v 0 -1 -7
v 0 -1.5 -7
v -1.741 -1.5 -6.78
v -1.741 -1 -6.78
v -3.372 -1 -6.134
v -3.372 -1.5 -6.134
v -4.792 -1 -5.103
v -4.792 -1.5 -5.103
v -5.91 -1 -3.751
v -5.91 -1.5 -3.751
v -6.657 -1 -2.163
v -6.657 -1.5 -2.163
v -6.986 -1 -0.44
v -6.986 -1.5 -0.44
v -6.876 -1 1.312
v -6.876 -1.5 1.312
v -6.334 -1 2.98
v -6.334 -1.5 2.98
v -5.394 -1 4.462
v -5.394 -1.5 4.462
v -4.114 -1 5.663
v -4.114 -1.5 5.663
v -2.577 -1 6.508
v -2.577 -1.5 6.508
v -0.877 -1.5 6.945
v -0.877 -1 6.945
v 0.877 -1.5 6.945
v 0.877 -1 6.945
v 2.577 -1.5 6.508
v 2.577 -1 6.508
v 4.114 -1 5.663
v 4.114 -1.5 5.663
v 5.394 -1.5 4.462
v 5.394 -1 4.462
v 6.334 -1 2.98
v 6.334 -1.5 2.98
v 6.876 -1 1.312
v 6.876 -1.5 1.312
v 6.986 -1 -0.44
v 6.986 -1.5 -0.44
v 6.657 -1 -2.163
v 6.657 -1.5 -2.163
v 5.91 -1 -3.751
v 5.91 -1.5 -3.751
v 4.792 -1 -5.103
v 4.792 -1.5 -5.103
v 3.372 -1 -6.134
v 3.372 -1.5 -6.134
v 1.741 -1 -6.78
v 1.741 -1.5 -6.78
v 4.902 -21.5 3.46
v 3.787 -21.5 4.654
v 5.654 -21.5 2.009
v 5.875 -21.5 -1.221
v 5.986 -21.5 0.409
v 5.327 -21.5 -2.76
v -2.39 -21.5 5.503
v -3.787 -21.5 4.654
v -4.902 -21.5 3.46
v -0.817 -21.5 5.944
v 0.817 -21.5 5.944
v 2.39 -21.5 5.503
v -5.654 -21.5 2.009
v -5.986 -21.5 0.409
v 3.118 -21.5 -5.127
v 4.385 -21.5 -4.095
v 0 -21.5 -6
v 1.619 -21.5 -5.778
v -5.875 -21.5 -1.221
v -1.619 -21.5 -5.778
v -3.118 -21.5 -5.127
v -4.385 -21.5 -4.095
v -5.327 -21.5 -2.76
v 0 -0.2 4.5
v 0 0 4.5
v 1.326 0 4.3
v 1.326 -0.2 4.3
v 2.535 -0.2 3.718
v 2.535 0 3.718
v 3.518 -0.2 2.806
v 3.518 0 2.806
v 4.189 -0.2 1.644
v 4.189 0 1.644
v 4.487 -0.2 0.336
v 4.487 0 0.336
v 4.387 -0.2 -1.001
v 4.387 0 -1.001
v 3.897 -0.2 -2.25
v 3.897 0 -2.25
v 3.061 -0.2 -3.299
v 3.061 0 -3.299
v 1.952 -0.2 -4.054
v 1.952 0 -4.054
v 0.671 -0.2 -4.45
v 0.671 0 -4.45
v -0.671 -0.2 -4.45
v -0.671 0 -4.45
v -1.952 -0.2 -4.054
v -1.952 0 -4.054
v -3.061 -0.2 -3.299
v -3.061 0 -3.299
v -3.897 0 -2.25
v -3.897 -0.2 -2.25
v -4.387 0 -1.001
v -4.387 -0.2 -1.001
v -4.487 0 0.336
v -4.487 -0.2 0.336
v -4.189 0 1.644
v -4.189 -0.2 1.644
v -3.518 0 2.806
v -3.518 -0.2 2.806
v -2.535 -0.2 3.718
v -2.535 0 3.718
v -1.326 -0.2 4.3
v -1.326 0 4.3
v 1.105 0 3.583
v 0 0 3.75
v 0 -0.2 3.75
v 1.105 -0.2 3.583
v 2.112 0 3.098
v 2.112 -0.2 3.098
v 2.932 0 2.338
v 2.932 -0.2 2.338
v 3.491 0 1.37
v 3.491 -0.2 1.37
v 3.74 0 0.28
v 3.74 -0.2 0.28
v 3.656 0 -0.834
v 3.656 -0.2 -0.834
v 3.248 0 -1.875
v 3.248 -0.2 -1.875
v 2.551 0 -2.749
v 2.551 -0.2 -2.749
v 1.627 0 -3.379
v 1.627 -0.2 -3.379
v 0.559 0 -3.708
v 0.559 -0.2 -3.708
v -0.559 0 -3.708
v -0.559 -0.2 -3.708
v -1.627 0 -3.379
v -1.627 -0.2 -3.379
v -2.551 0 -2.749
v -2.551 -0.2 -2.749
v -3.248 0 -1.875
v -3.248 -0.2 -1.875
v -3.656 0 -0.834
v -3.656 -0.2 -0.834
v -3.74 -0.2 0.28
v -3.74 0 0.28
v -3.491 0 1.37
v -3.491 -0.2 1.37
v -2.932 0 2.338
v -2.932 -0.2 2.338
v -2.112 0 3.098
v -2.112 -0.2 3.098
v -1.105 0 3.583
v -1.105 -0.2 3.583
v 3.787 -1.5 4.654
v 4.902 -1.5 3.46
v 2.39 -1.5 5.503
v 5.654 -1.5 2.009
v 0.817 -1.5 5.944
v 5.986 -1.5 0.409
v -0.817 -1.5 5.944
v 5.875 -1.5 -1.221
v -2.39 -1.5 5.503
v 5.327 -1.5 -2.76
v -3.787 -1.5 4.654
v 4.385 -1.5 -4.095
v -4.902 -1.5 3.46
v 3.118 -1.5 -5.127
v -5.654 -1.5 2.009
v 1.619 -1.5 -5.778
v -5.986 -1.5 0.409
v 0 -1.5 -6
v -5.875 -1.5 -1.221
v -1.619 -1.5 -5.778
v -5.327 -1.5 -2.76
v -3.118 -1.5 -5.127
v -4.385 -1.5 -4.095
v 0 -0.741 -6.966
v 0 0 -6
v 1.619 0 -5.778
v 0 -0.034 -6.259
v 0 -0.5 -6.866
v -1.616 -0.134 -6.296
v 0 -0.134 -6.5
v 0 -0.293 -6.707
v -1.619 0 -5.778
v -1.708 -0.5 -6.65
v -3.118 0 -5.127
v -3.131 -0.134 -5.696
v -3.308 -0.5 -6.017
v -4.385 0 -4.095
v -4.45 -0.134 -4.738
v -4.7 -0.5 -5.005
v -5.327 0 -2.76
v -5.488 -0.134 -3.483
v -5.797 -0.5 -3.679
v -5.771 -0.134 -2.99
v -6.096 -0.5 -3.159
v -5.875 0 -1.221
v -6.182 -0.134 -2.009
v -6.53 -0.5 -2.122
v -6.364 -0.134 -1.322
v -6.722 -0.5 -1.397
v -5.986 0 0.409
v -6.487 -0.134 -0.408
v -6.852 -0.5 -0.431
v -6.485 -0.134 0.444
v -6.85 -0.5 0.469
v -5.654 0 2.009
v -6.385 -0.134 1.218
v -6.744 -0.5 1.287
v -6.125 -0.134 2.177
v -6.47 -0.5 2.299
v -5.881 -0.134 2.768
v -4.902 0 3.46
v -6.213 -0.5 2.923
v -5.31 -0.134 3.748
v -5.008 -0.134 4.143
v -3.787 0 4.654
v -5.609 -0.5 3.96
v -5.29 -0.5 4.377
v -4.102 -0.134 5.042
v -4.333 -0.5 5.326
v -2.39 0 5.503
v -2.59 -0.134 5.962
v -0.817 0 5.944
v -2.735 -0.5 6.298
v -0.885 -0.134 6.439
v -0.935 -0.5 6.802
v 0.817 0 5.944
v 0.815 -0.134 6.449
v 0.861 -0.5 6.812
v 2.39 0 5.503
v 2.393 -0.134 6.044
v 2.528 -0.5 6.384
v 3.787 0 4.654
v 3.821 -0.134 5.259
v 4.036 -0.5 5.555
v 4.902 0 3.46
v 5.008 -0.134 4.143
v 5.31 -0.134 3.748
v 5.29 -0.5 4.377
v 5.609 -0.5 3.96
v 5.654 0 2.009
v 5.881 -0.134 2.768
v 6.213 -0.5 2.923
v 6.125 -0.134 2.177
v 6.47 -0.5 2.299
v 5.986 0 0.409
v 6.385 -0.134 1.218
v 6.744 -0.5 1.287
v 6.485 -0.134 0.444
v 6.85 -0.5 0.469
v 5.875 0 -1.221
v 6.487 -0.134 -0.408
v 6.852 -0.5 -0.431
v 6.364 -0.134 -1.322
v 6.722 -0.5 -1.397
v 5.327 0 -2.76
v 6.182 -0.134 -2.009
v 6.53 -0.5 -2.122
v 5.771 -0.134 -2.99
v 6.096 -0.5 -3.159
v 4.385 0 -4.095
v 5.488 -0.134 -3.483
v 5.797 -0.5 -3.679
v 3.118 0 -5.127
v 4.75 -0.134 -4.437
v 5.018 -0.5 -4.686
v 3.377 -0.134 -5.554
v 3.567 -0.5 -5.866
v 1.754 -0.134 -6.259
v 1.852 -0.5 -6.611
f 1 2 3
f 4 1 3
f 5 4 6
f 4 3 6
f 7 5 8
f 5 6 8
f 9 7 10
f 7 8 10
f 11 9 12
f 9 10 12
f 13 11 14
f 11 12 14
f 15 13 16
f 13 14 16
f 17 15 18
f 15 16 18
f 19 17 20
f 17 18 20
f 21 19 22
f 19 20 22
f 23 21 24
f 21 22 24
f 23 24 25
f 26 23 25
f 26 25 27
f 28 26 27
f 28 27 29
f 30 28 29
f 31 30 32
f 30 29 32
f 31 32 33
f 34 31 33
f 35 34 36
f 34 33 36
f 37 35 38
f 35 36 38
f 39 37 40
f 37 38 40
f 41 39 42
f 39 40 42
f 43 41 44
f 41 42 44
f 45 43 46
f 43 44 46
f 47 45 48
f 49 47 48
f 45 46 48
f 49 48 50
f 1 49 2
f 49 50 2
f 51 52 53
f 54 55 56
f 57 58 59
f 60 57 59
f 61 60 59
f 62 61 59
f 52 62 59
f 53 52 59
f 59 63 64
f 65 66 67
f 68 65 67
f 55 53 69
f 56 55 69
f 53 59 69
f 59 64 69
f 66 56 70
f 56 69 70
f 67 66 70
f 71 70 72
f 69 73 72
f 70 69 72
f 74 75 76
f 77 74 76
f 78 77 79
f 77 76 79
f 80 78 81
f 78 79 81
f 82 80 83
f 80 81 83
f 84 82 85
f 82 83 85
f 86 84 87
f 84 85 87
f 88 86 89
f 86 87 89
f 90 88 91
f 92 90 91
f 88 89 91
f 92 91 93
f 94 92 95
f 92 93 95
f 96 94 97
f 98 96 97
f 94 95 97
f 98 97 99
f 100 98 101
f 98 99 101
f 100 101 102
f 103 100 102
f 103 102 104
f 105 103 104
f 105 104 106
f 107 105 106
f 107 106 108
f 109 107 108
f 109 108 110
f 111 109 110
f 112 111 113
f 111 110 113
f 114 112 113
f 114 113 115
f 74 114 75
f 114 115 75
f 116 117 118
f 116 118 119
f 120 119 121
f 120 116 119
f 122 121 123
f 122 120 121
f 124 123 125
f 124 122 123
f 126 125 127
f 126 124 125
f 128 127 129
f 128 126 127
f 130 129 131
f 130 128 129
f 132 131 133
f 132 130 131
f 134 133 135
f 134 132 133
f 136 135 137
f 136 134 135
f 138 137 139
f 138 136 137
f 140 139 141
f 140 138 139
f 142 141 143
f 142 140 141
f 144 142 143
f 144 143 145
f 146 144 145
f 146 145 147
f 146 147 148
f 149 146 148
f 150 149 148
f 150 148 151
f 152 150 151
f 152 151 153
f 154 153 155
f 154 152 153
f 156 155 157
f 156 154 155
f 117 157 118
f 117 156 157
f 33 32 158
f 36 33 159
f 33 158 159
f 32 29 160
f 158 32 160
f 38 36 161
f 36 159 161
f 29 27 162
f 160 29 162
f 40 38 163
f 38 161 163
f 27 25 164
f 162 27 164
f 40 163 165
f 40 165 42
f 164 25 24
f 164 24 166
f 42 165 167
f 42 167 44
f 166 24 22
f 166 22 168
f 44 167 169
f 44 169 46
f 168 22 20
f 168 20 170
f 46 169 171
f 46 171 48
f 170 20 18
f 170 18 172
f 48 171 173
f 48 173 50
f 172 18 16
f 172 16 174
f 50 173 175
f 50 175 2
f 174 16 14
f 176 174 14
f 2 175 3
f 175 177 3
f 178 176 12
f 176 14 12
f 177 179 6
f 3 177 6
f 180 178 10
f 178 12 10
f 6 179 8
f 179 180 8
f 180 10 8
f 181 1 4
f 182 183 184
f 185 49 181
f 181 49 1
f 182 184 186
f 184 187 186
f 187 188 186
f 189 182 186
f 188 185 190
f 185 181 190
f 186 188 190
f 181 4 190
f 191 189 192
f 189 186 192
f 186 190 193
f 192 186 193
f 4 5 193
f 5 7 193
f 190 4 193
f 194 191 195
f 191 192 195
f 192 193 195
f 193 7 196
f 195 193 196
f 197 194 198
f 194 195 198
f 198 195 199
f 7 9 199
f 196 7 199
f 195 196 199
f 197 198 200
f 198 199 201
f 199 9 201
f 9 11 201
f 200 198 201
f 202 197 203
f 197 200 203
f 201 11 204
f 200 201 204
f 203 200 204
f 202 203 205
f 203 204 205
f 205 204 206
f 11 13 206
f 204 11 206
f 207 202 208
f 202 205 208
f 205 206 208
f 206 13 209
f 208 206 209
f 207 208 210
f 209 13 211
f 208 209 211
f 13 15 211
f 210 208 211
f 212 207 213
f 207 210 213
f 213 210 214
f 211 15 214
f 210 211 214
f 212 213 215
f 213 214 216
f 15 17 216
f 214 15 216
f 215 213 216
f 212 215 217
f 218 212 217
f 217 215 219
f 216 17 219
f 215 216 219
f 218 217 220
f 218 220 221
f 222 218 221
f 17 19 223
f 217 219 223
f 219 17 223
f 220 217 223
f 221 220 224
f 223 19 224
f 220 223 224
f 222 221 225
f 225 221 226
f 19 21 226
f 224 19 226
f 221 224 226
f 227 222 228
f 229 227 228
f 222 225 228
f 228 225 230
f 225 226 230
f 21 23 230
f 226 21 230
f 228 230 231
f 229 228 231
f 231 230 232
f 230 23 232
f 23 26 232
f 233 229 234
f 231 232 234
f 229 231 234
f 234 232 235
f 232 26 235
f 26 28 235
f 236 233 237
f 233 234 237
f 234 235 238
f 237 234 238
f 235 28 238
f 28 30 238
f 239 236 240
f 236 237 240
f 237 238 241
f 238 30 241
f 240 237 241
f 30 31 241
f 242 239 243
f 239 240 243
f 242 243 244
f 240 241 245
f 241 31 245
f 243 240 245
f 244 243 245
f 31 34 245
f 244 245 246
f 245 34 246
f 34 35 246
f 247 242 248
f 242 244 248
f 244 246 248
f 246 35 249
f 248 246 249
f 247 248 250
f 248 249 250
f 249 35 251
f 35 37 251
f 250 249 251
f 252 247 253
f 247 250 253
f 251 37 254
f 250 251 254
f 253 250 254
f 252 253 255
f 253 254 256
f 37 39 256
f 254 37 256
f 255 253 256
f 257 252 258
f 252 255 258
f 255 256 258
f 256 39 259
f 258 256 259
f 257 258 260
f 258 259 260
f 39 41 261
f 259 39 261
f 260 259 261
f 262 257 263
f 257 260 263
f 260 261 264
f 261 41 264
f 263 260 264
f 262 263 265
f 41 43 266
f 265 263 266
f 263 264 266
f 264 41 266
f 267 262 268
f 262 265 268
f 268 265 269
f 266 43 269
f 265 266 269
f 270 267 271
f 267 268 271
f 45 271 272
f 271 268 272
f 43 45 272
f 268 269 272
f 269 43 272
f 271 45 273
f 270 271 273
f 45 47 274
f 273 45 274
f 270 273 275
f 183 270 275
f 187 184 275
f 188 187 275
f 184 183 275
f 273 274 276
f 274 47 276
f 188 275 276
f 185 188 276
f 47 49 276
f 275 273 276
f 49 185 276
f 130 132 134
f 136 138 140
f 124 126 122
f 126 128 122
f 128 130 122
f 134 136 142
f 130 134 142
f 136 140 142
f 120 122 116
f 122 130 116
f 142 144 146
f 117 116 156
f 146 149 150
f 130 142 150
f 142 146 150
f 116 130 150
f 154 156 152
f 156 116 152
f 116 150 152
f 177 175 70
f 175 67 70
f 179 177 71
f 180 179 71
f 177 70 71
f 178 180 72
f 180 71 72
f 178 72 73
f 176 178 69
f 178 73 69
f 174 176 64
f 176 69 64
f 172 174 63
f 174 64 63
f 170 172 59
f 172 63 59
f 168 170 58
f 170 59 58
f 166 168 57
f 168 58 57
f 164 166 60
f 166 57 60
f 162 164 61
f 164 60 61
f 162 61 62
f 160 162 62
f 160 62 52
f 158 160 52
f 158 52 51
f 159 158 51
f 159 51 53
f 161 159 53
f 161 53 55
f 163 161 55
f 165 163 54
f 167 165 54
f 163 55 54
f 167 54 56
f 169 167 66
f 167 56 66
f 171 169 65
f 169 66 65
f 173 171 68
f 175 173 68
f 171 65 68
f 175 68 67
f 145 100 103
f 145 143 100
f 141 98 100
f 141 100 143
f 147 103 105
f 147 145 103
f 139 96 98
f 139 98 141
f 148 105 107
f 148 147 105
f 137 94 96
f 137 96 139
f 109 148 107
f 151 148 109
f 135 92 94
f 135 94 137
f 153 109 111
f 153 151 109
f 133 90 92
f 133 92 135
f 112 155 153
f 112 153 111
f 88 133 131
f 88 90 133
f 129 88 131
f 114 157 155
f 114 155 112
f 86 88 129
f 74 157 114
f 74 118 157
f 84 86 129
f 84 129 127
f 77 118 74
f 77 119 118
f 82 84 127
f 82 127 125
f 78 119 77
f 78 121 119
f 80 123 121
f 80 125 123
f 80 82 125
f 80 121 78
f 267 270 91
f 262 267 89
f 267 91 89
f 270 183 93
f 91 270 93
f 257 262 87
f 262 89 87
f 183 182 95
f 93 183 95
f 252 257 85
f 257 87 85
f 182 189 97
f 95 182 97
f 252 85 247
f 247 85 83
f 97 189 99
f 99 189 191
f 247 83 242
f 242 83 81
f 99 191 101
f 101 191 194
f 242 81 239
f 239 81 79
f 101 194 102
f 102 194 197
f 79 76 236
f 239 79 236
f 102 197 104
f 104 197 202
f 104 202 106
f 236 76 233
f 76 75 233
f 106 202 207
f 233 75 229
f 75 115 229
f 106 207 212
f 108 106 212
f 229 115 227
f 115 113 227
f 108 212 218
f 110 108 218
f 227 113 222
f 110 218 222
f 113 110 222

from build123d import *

# Parameters (mm, degrees)
FILLET_1_R          = 1
SKETCH_2_R          = 4.5
SKETCH_2_R_2        = 3.75
CUT_EXTRUDE_1_DEPTH = 0.2


with BuildPart() as part:
    # 草图1 → 旋转1 (revolve)
    with BuildSketch(Plane.XY, mode=Mode.PRIVATE) as revolve_1_sk:
        Polygon((0, 0), (7, 0), (7, -1.5), (6, -1.5), (6, -21.5), (0, -21.5), align=None)
    revolve(revolve_1_sk.sketch.rotate(Axis((0, 0, 0), (0, 1, 0)), 90), axis=Axis((0, 0, 0), (0, 1, 0)))

    # 圆角1
    fillet_1_edges = [part.edges().sort_by_distance(p)[0] for p in [
        (0, 0, 7),
    ]]
    fillet(fillet_1_edges, radius=FILLET_1_R)

    # 草图2 → 切除-拉伸1 (cut)
    with BuildSketch(Plane(origin=(0, 0, 0), x_dir=(1, 0, 0), z_dir=(0, 1, 0))):
        with Locations(Location((0, 0, 0), (0, 0, 270))):
            Circle(SKETCH_2_R)
        with Locations(Location((0, 0, 0), (0, 0, 270))):
            Circle(SKETCH_2_R_2, mode=Mode.SUBTRACT)
    extrude(amount=-CUT_EXTRUDE_1_DEPTH, mode=Mode.SUBTRACT)


solid = part.part
